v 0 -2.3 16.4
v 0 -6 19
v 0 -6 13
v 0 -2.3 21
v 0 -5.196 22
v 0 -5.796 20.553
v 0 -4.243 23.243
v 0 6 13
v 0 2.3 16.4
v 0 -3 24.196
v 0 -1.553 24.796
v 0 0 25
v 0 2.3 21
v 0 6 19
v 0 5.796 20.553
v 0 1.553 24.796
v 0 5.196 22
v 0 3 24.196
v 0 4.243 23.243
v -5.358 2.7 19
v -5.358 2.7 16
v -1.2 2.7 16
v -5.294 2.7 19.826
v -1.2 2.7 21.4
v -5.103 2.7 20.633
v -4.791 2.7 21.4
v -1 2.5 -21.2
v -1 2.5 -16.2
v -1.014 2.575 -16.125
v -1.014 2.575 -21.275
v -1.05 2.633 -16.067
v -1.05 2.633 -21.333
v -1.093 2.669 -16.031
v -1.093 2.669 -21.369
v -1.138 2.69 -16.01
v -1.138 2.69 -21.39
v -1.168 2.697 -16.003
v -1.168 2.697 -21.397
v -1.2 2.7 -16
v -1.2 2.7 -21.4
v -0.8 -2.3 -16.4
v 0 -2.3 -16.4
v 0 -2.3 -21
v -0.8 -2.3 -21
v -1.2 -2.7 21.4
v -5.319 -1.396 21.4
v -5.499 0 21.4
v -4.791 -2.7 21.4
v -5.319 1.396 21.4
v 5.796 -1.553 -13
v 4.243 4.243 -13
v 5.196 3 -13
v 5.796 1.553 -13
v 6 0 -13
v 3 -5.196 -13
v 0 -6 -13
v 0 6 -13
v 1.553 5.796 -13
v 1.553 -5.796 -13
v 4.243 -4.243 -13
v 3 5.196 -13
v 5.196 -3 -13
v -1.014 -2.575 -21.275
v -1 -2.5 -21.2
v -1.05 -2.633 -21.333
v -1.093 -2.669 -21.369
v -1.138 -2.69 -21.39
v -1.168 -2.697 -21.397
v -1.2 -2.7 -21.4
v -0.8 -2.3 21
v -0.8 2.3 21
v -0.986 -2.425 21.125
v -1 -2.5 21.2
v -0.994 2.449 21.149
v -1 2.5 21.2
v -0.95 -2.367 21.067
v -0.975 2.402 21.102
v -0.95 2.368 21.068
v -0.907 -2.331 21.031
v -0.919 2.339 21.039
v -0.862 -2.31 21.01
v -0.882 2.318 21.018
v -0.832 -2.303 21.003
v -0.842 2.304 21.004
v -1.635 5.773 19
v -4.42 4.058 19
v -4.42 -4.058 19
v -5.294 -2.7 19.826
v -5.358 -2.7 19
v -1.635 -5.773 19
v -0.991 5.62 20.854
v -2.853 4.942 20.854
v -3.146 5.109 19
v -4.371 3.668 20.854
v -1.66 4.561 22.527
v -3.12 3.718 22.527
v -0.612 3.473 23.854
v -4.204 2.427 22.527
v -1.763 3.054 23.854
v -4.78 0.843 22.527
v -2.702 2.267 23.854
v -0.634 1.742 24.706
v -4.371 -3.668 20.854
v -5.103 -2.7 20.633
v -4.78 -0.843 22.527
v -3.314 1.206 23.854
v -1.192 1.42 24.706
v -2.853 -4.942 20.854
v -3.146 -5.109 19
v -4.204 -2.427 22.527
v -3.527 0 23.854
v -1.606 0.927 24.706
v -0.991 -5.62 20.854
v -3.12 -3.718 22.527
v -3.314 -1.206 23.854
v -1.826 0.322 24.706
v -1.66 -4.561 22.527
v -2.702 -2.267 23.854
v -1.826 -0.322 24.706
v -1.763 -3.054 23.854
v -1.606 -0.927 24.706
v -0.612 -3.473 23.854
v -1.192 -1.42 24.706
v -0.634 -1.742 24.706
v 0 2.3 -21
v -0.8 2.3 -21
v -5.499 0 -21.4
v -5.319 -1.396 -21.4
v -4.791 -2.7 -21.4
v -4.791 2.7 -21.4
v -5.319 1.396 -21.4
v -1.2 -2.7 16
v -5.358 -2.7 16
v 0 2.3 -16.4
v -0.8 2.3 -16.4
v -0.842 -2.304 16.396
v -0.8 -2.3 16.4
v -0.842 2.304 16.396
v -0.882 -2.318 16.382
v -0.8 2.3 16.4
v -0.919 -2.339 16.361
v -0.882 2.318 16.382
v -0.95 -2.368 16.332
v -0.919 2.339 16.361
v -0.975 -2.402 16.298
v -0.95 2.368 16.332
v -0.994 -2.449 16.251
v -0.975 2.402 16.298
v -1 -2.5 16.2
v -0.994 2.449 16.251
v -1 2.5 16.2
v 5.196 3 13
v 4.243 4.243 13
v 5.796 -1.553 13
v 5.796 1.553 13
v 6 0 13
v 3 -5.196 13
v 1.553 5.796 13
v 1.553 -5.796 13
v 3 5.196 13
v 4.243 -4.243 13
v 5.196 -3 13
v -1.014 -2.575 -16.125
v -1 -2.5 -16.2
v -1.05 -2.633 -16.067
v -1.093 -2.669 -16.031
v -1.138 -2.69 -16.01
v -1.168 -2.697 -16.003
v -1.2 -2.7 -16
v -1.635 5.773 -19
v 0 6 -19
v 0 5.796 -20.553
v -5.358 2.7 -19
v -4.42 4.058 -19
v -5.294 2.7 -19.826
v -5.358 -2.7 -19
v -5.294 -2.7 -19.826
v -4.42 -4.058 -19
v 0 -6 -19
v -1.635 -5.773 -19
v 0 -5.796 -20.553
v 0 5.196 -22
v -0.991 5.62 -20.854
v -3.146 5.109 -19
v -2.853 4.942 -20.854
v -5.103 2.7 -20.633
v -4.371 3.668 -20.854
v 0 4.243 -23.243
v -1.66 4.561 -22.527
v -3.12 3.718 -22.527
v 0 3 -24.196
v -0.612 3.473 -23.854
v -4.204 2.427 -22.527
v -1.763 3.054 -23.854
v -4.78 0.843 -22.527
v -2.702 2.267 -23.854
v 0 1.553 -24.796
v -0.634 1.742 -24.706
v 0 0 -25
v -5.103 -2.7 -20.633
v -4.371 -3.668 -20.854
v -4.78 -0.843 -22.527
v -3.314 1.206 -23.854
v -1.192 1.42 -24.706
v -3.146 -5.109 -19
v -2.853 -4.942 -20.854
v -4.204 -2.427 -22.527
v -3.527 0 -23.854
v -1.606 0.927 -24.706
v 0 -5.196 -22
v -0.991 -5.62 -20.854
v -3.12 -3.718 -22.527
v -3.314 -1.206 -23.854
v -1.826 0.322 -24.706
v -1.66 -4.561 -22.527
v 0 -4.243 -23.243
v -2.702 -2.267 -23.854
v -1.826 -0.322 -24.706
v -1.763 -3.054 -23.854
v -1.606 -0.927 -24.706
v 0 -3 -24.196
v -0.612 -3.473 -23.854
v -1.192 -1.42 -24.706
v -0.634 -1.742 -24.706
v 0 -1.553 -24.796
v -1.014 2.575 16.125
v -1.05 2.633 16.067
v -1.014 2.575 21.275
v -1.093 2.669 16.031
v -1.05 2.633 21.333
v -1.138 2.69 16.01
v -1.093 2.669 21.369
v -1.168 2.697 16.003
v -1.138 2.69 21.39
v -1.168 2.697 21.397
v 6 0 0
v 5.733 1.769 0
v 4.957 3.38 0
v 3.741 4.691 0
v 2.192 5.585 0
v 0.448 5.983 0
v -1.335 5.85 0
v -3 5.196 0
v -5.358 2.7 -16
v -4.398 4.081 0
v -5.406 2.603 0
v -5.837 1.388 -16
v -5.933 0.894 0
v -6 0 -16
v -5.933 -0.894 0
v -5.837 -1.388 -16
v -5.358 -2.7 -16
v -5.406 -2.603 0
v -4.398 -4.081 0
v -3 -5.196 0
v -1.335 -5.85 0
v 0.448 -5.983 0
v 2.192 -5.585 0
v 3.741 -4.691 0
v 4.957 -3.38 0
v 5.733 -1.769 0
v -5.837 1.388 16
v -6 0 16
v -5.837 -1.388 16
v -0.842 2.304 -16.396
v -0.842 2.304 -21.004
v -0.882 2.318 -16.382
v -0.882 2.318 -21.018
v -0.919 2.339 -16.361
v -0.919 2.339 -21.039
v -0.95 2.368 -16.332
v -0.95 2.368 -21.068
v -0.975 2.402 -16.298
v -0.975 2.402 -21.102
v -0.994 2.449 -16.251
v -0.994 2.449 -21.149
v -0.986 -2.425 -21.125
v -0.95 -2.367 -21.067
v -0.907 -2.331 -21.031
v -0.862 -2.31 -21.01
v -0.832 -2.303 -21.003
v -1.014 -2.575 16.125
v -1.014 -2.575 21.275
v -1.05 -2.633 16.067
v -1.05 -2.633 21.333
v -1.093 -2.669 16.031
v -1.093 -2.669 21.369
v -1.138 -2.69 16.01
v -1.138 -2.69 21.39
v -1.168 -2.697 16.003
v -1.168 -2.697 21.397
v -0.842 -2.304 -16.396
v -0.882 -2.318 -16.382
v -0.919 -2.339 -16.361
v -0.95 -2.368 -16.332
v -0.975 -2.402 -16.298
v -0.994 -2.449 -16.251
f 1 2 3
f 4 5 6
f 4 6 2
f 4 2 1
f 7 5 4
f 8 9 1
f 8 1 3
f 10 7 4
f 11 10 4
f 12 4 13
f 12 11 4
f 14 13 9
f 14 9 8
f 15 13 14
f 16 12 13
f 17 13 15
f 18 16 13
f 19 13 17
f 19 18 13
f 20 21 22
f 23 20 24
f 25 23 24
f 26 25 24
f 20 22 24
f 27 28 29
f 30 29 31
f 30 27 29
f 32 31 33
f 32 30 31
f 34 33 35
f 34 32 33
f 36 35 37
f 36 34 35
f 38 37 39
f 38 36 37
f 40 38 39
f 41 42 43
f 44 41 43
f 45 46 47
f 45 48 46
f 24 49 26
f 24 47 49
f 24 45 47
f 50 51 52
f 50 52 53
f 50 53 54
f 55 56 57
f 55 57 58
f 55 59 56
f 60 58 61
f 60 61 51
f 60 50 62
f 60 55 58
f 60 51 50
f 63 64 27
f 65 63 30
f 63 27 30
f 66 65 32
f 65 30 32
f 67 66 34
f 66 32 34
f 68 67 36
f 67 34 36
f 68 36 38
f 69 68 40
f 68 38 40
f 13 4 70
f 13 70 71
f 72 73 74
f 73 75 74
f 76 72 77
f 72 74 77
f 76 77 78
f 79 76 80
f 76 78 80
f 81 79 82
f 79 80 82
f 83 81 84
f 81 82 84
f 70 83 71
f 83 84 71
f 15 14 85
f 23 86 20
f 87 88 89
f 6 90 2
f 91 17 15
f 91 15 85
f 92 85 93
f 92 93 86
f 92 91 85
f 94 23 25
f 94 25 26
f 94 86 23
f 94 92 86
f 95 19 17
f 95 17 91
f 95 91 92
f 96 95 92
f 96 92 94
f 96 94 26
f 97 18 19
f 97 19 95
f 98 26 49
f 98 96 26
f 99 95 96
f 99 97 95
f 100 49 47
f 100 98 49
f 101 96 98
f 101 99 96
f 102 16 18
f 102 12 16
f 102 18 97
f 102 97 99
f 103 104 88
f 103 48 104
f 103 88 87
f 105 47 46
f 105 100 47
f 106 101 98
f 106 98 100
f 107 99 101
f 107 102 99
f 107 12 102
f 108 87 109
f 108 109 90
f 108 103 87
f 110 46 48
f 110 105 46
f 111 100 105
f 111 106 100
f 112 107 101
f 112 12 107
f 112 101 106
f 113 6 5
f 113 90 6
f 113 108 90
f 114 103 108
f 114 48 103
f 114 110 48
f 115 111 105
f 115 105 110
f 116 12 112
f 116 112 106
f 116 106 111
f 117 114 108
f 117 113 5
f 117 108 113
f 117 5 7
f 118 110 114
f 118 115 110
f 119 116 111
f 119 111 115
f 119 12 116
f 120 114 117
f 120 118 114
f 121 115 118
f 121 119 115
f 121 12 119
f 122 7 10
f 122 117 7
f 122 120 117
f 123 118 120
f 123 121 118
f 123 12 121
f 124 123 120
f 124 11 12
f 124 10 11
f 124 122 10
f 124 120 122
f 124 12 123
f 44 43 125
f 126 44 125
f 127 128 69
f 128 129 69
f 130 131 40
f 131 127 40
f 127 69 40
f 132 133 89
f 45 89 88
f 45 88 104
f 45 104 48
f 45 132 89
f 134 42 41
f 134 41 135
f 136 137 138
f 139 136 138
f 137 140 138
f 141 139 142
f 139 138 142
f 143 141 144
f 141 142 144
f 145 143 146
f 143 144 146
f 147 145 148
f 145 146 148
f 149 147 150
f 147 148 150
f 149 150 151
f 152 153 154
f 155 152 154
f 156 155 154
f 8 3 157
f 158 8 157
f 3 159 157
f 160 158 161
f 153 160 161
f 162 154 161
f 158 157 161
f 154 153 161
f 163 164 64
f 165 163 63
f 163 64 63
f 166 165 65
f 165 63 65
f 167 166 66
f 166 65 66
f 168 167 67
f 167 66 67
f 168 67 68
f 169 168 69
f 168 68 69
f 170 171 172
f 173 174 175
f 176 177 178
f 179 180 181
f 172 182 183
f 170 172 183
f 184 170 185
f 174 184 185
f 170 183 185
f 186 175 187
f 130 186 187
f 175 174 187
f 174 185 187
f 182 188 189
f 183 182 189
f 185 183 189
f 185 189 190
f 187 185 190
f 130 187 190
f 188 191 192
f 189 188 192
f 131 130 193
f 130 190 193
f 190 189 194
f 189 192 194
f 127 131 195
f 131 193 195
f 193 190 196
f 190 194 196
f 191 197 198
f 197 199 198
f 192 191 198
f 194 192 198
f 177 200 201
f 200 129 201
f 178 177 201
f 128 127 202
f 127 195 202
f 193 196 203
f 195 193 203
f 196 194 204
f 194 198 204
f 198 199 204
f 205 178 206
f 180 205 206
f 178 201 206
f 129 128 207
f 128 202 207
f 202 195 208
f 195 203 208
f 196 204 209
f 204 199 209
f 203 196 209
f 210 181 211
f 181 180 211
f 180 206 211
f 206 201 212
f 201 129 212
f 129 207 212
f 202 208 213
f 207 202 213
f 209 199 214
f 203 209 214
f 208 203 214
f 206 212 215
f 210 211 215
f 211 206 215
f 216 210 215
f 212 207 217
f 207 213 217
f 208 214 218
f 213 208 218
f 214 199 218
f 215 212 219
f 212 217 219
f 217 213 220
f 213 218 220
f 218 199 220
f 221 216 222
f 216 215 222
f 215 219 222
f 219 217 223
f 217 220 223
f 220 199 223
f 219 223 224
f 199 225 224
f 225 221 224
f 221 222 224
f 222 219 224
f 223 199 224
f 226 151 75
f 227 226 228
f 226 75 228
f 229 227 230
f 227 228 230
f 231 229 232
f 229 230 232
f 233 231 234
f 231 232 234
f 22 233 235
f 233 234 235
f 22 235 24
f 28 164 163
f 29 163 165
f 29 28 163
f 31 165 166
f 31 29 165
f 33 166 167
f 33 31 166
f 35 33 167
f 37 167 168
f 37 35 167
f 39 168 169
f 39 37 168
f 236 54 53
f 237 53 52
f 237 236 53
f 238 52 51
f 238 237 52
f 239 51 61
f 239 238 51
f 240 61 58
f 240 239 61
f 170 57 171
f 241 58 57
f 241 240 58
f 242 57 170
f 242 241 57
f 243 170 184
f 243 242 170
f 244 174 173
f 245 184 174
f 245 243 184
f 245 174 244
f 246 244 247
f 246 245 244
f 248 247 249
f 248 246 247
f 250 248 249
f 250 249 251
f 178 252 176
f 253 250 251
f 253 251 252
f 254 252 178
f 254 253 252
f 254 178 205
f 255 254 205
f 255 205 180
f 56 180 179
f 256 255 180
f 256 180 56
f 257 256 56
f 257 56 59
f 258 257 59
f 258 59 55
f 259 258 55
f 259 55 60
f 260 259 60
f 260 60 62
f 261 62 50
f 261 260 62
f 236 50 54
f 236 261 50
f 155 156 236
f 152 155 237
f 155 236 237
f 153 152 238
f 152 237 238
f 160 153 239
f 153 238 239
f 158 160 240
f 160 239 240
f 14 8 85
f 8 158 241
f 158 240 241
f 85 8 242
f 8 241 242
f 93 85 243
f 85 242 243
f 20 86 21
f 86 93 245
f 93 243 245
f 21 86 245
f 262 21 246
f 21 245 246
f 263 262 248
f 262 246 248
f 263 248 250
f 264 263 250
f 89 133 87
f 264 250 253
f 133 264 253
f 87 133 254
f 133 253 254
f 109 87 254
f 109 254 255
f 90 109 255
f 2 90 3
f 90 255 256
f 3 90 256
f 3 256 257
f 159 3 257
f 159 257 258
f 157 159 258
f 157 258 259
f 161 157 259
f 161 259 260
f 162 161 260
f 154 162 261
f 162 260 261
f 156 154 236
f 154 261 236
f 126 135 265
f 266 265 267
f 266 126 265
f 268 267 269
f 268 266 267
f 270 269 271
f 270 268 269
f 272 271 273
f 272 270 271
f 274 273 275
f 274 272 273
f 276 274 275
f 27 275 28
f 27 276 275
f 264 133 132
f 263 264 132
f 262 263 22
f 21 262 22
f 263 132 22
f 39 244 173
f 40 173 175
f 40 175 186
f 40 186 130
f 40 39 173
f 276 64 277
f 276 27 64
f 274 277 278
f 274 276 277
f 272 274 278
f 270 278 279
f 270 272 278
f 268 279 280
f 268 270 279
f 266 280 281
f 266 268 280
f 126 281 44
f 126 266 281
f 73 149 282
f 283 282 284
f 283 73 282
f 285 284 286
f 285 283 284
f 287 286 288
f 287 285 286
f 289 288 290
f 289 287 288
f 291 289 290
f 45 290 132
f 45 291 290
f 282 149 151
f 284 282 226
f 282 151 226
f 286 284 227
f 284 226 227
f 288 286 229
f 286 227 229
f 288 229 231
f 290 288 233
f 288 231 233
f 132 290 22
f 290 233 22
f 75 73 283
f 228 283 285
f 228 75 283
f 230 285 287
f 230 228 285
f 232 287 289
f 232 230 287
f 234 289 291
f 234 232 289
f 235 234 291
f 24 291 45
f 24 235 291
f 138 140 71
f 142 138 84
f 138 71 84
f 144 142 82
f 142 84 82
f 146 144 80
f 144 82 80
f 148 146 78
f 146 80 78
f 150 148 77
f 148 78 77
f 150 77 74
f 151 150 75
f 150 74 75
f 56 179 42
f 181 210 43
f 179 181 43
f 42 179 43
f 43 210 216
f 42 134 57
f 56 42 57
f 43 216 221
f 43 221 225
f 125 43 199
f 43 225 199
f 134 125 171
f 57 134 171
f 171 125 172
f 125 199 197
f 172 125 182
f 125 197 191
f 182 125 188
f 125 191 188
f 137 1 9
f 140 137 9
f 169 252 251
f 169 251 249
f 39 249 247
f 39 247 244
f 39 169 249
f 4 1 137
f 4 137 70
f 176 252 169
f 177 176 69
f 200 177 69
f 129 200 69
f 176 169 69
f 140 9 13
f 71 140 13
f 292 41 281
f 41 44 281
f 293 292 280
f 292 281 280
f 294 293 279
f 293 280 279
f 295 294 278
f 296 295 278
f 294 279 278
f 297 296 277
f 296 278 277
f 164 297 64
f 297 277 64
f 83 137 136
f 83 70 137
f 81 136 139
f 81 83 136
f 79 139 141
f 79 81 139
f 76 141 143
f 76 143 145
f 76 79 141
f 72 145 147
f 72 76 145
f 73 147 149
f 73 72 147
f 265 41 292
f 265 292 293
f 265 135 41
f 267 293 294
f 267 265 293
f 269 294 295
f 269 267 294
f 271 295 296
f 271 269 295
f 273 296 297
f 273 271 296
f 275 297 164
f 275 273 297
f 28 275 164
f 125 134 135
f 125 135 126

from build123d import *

# Parameters (mm, degrees)
F0_R     = 6
F1_DEPTH = 25
F2_R     = 6
F3_W     = 7.4530789975
F3_H     = 13.9023570546
F4_DEPTH = 12.5
F5_W     = 5.4
F5_H     = 5.4
F6_DEPTH = 25
F7_W     = 5.4
F7_H     = 5.4
F7_W_2   = 4.6
F7_H_2   = 4.6
F8_DEPTH = 1
F9_R     = 0.19999


# Not quite as in the source:
# - a fillet or chamfer is up to 0.001 mm smaller than in the source, because OpenCascade refuses the exact size


with BuildPart() as f1:
    # F0 (on Top) → F1 (new body)
    with BuildSketch(Plane.XY):
        Circle(F0_R)
    extrude(amount=F1_DEPTH)

    # F2
    f2_edges = [f1.edges().sort_by_distance(p)[0] for p in [
        (-6, 0, 25),
    ]]
    fillet(f2_edges, radius=F2_R)

    # F3 (on Front) → F4 (cut, symmetric)
    with BuildSketch(Plane.XZ):
        with Locations((3.7265394987, 19.9511785273)):
            Rectangle(F3_W, F3_H)
    extrude(amount=F4_DEPTH, both=True, mode=Mode.SUBTRACT)

    # F5 (on face) → F6 (cut)
    with BuildSketch(Plane.YZ):
        with Locations((0, 18.7)):
            Rectangle(F5_W, F5_H)
    extrude(amount=-F6_DEPTH, mode=Mode.SUBTRACT)

    # F7 (on face) → F8 (join)
    with BuildSketch(Plane.YZ):
        with Locations((0, 18.7)):
            Rectangle(F7_W, F7_H)
        with Locations((0, 18.7)):
            Rectangle(F7_W_2, F7_H_2, mode=Mode.SUBTRACT)
    extrude(amount=-F8_DEPTH)

    # F9 (radius 0.2 in the source; OpenCascade refuses exactly that, so slightly less here)
    f9_edges = [f1.edges().sort_by_distance(p)[0] for p in [
        (-1, 0, 16.4),
        (-1, 2.3, 18.7),
        (-1, 0, 21),
        (-1, -2.3, 18.7),
        (-1, 0, 21.4),
        (-1, -2.7, 18.7),
        (-1, 2.7, 18.7),
        (-1, 0, 16),
    ]]
    fillet(f9_edges, radius=F9_R)

    # F10: F1 across plane


with BuildPart() as f1_1:
    add(f1.part)
    add(f1.part.mirror(Plane.XY))


solid = f1_1.part
